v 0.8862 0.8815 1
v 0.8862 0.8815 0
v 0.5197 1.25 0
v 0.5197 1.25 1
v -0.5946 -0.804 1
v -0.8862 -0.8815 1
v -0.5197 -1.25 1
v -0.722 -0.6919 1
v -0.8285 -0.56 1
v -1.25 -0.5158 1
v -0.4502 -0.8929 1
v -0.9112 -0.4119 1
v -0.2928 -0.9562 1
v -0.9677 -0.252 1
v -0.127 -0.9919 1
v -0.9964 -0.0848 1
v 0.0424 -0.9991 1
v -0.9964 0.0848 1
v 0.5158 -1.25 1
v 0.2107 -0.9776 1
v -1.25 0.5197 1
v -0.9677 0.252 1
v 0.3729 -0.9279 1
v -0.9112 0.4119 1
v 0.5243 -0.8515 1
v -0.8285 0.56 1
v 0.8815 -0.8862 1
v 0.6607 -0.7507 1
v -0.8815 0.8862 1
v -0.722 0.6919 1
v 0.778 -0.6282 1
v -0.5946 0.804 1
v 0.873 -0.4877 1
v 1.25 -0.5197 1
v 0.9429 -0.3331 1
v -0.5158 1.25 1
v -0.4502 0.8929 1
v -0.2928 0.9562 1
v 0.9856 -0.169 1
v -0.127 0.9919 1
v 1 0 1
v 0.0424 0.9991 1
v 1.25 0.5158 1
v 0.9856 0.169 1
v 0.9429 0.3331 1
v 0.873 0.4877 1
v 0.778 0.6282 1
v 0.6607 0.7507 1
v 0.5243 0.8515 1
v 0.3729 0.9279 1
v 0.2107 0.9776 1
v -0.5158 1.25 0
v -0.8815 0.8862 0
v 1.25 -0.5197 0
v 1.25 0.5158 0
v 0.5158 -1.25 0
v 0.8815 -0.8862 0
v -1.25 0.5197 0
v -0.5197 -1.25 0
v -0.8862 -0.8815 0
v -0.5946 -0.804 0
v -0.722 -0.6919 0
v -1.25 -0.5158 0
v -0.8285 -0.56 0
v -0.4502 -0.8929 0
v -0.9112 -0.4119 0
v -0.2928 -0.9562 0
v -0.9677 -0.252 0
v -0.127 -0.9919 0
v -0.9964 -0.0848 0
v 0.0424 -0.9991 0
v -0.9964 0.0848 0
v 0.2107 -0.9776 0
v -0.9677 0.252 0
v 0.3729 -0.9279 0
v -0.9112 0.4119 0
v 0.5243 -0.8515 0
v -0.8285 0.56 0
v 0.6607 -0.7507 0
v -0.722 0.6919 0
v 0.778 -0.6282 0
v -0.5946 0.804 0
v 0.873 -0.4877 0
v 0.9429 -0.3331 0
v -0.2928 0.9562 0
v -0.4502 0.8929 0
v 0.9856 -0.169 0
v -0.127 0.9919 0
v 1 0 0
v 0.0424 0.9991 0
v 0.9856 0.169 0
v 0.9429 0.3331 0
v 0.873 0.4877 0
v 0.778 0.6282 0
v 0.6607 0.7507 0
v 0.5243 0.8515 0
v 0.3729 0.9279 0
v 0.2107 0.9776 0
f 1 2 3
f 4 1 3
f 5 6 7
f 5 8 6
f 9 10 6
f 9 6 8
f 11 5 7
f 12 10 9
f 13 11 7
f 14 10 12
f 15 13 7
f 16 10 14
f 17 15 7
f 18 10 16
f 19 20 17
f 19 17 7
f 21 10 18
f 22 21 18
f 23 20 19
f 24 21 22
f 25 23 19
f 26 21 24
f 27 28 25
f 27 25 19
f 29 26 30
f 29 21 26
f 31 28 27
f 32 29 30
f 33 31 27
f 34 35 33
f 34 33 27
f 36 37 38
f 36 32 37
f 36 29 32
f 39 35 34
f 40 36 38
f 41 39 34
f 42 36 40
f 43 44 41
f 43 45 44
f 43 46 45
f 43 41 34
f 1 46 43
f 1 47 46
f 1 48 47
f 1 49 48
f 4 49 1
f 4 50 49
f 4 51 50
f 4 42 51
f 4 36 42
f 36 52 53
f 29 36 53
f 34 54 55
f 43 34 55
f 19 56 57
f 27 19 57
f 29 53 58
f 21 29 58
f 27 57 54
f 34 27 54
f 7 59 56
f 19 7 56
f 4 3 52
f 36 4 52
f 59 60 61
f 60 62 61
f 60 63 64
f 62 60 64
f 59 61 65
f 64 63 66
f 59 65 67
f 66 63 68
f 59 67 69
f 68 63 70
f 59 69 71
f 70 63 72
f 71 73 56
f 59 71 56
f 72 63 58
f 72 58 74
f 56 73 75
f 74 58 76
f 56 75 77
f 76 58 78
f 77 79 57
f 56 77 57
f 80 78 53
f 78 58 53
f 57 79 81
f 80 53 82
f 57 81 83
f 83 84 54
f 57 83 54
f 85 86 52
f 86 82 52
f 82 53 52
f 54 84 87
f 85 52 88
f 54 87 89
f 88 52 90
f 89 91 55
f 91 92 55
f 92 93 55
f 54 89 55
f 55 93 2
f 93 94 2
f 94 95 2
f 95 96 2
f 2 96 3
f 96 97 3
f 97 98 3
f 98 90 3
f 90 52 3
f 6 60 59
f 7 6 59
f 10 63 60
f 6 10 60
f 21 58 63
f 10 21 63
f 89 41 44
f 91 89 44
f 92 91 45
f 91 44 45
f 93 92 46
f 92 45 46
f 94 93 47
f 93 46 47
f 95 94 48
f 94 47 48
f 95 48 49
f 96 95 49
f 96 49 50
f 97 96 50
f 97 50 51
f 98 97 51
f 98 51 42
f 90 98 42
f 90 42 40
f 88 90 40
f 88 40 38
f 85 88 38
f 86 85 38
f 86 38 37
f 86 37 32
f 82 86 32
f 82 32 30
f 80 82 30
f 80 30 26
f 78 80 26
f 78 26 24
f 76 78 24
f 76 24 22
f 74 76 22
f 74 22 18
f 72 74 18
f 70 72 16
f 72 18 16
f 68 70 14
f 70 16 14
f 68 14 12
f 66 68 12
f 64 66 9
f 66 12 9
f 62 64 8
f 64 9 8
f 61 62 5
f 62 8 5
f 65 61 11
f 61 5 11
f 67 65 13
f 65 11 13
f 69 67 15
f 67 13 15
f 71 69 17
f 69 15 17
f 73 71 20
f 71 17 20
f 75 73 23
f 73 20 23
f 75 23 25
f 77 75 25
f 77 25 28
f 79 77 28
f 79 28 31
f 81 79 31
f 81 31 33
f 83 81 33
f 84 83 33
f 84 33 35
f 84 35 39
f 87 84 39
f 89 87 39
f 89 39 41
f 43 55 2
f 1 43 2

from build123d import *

# Parameters (mm, degrees)
F1_DEPTH = 1
F2_R     = 1
F3_DEPTH = 25


with BuildPart() as f1:
    # F0 (on Top) → F1 (new body)
    with BuildSketch(Plane.XY):
        Polygon((-0.881542, 0.886219), (0, 0), (0, 1.25), (-0.515831, 1.25), align=None)
        Polygon((0.881542, -0.886219), (0, 0), (0, -1.25), (0.515831, -1.25), align=None)
        Polygon((0.886219, 0.881542), (0, 0), (1.25, 0), (1.25, 0.515831), align=None)
        Polygon((-0.886219, -0.881542), (0, 0), (-1.25, 0), (-1.25, -0.515831), align=None)
        Polygon((0, 1.25), (0, 0), (0.886219, 0.881542), (0.519705, 1.25), align=None)
        Polygon((0, -1.25), (0, 0), (-0.886219, -0.881542), (-0.519705, -1.25), align=None)
        Polygon((1.25, 0), (0, 0), (0.881542, -0.886219), (1.25, -0.519705), align=None)
        Polygon((-1.25, 0), (0, 0), (-0.881542, 0.886219), (-1.25, 0.519705), align=None)
    extrude(amount=F1_DEPTH)

    # F2 (on face) → F3 (cut)
    with BuildSketch(Plane.XY.offset(1)):
        Circle(F2_R)
    extrude(amount=-F3_DEPTH, mode=Mode.SUBTRACT)


solid = f1.part
